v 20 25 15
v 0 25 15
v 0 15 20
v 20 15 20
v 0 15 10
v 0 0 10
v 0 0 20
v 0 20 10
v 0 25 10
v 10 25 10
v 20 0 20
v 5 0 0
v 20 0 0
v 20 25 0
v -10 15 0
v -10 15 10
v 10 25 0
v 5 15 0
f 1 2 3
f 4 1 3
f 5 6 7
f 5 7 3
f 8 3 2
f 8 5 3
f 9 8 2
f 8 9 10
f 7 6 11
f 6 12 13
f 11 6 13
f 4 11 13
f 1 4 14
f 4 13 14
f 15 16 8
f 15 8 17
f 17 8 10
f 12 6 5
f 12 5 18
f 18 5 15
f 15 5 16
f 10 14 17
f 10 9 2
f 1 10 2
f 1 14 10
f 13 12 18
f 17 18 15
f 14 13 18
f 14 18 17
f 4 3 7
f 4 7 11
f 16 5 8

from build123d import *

# Parameters (mm, degrees)
SKETCH1_W           = 20
SKETCH1_H           = 25
BOSS_EXTRUDE1_DEPTH = 20
CUT_EXTRUDE1_DEPTH  = 20
SKETCH4_W           = 10
SKETCH4_H           = 10
BOSS_EXTRUDE2_DEPTH = 10
CUT_EXTRUDE2_DEPTH  = 50
CUT_EXTRUDE3_DEPTH  = 15


with BuildPart() as part:
    # Sketch1 → Boss-Extrude1 (new body)
    with BuildSketch(Plane.XY):
        with Locations((10, 12.5)):
            Rectangle(SKETCH1_W, SKETCH1_H)
    extrude(amount=BOSS_EXTRUDE1_DEPTH)

    # Sketch3 → Cut-Extrude1 (cut)
    with BuildSketch(Plane.ZY):
        Polygon((15, 25), (20, 15), (20, 25), align=None)
    extrude(amount=-CUT_EXTRUDE1_DEPTH, mode=Mode.SUBTRACT)

    # Sketch4 → Boss-Extrude2 (add)
    with BuildSketch(Plane.ZY):
        with Locations((5, 20)):
            Rectangle(SKETCH4_W, SKETCH4_H)
    extrude(amount=BOSS_EXTRUDE2_DEPTH)

    # Sketch5 → Cut-Extrude2 (cut)
    with BuildSketch(Plane.XY.offset(10)):
        Polygon((-10, 15), (10, 25), (-10, 25), align=None)
    extrude(amount=-CUT_EXTRUDE2_DEPTH, mode=Mode.SUBTRACT)

    # Sketch6 → Cut-Extrude3 (cut)
    with BuildSketch(Plane.XZ):
        Polygon((0, 10), (5, 0), (0, 0), align=None)
    extrude(amount=-CUT_EXTRUDE3_DEPTH, mode=Mode.SUBTRACT)


solid = part.part
